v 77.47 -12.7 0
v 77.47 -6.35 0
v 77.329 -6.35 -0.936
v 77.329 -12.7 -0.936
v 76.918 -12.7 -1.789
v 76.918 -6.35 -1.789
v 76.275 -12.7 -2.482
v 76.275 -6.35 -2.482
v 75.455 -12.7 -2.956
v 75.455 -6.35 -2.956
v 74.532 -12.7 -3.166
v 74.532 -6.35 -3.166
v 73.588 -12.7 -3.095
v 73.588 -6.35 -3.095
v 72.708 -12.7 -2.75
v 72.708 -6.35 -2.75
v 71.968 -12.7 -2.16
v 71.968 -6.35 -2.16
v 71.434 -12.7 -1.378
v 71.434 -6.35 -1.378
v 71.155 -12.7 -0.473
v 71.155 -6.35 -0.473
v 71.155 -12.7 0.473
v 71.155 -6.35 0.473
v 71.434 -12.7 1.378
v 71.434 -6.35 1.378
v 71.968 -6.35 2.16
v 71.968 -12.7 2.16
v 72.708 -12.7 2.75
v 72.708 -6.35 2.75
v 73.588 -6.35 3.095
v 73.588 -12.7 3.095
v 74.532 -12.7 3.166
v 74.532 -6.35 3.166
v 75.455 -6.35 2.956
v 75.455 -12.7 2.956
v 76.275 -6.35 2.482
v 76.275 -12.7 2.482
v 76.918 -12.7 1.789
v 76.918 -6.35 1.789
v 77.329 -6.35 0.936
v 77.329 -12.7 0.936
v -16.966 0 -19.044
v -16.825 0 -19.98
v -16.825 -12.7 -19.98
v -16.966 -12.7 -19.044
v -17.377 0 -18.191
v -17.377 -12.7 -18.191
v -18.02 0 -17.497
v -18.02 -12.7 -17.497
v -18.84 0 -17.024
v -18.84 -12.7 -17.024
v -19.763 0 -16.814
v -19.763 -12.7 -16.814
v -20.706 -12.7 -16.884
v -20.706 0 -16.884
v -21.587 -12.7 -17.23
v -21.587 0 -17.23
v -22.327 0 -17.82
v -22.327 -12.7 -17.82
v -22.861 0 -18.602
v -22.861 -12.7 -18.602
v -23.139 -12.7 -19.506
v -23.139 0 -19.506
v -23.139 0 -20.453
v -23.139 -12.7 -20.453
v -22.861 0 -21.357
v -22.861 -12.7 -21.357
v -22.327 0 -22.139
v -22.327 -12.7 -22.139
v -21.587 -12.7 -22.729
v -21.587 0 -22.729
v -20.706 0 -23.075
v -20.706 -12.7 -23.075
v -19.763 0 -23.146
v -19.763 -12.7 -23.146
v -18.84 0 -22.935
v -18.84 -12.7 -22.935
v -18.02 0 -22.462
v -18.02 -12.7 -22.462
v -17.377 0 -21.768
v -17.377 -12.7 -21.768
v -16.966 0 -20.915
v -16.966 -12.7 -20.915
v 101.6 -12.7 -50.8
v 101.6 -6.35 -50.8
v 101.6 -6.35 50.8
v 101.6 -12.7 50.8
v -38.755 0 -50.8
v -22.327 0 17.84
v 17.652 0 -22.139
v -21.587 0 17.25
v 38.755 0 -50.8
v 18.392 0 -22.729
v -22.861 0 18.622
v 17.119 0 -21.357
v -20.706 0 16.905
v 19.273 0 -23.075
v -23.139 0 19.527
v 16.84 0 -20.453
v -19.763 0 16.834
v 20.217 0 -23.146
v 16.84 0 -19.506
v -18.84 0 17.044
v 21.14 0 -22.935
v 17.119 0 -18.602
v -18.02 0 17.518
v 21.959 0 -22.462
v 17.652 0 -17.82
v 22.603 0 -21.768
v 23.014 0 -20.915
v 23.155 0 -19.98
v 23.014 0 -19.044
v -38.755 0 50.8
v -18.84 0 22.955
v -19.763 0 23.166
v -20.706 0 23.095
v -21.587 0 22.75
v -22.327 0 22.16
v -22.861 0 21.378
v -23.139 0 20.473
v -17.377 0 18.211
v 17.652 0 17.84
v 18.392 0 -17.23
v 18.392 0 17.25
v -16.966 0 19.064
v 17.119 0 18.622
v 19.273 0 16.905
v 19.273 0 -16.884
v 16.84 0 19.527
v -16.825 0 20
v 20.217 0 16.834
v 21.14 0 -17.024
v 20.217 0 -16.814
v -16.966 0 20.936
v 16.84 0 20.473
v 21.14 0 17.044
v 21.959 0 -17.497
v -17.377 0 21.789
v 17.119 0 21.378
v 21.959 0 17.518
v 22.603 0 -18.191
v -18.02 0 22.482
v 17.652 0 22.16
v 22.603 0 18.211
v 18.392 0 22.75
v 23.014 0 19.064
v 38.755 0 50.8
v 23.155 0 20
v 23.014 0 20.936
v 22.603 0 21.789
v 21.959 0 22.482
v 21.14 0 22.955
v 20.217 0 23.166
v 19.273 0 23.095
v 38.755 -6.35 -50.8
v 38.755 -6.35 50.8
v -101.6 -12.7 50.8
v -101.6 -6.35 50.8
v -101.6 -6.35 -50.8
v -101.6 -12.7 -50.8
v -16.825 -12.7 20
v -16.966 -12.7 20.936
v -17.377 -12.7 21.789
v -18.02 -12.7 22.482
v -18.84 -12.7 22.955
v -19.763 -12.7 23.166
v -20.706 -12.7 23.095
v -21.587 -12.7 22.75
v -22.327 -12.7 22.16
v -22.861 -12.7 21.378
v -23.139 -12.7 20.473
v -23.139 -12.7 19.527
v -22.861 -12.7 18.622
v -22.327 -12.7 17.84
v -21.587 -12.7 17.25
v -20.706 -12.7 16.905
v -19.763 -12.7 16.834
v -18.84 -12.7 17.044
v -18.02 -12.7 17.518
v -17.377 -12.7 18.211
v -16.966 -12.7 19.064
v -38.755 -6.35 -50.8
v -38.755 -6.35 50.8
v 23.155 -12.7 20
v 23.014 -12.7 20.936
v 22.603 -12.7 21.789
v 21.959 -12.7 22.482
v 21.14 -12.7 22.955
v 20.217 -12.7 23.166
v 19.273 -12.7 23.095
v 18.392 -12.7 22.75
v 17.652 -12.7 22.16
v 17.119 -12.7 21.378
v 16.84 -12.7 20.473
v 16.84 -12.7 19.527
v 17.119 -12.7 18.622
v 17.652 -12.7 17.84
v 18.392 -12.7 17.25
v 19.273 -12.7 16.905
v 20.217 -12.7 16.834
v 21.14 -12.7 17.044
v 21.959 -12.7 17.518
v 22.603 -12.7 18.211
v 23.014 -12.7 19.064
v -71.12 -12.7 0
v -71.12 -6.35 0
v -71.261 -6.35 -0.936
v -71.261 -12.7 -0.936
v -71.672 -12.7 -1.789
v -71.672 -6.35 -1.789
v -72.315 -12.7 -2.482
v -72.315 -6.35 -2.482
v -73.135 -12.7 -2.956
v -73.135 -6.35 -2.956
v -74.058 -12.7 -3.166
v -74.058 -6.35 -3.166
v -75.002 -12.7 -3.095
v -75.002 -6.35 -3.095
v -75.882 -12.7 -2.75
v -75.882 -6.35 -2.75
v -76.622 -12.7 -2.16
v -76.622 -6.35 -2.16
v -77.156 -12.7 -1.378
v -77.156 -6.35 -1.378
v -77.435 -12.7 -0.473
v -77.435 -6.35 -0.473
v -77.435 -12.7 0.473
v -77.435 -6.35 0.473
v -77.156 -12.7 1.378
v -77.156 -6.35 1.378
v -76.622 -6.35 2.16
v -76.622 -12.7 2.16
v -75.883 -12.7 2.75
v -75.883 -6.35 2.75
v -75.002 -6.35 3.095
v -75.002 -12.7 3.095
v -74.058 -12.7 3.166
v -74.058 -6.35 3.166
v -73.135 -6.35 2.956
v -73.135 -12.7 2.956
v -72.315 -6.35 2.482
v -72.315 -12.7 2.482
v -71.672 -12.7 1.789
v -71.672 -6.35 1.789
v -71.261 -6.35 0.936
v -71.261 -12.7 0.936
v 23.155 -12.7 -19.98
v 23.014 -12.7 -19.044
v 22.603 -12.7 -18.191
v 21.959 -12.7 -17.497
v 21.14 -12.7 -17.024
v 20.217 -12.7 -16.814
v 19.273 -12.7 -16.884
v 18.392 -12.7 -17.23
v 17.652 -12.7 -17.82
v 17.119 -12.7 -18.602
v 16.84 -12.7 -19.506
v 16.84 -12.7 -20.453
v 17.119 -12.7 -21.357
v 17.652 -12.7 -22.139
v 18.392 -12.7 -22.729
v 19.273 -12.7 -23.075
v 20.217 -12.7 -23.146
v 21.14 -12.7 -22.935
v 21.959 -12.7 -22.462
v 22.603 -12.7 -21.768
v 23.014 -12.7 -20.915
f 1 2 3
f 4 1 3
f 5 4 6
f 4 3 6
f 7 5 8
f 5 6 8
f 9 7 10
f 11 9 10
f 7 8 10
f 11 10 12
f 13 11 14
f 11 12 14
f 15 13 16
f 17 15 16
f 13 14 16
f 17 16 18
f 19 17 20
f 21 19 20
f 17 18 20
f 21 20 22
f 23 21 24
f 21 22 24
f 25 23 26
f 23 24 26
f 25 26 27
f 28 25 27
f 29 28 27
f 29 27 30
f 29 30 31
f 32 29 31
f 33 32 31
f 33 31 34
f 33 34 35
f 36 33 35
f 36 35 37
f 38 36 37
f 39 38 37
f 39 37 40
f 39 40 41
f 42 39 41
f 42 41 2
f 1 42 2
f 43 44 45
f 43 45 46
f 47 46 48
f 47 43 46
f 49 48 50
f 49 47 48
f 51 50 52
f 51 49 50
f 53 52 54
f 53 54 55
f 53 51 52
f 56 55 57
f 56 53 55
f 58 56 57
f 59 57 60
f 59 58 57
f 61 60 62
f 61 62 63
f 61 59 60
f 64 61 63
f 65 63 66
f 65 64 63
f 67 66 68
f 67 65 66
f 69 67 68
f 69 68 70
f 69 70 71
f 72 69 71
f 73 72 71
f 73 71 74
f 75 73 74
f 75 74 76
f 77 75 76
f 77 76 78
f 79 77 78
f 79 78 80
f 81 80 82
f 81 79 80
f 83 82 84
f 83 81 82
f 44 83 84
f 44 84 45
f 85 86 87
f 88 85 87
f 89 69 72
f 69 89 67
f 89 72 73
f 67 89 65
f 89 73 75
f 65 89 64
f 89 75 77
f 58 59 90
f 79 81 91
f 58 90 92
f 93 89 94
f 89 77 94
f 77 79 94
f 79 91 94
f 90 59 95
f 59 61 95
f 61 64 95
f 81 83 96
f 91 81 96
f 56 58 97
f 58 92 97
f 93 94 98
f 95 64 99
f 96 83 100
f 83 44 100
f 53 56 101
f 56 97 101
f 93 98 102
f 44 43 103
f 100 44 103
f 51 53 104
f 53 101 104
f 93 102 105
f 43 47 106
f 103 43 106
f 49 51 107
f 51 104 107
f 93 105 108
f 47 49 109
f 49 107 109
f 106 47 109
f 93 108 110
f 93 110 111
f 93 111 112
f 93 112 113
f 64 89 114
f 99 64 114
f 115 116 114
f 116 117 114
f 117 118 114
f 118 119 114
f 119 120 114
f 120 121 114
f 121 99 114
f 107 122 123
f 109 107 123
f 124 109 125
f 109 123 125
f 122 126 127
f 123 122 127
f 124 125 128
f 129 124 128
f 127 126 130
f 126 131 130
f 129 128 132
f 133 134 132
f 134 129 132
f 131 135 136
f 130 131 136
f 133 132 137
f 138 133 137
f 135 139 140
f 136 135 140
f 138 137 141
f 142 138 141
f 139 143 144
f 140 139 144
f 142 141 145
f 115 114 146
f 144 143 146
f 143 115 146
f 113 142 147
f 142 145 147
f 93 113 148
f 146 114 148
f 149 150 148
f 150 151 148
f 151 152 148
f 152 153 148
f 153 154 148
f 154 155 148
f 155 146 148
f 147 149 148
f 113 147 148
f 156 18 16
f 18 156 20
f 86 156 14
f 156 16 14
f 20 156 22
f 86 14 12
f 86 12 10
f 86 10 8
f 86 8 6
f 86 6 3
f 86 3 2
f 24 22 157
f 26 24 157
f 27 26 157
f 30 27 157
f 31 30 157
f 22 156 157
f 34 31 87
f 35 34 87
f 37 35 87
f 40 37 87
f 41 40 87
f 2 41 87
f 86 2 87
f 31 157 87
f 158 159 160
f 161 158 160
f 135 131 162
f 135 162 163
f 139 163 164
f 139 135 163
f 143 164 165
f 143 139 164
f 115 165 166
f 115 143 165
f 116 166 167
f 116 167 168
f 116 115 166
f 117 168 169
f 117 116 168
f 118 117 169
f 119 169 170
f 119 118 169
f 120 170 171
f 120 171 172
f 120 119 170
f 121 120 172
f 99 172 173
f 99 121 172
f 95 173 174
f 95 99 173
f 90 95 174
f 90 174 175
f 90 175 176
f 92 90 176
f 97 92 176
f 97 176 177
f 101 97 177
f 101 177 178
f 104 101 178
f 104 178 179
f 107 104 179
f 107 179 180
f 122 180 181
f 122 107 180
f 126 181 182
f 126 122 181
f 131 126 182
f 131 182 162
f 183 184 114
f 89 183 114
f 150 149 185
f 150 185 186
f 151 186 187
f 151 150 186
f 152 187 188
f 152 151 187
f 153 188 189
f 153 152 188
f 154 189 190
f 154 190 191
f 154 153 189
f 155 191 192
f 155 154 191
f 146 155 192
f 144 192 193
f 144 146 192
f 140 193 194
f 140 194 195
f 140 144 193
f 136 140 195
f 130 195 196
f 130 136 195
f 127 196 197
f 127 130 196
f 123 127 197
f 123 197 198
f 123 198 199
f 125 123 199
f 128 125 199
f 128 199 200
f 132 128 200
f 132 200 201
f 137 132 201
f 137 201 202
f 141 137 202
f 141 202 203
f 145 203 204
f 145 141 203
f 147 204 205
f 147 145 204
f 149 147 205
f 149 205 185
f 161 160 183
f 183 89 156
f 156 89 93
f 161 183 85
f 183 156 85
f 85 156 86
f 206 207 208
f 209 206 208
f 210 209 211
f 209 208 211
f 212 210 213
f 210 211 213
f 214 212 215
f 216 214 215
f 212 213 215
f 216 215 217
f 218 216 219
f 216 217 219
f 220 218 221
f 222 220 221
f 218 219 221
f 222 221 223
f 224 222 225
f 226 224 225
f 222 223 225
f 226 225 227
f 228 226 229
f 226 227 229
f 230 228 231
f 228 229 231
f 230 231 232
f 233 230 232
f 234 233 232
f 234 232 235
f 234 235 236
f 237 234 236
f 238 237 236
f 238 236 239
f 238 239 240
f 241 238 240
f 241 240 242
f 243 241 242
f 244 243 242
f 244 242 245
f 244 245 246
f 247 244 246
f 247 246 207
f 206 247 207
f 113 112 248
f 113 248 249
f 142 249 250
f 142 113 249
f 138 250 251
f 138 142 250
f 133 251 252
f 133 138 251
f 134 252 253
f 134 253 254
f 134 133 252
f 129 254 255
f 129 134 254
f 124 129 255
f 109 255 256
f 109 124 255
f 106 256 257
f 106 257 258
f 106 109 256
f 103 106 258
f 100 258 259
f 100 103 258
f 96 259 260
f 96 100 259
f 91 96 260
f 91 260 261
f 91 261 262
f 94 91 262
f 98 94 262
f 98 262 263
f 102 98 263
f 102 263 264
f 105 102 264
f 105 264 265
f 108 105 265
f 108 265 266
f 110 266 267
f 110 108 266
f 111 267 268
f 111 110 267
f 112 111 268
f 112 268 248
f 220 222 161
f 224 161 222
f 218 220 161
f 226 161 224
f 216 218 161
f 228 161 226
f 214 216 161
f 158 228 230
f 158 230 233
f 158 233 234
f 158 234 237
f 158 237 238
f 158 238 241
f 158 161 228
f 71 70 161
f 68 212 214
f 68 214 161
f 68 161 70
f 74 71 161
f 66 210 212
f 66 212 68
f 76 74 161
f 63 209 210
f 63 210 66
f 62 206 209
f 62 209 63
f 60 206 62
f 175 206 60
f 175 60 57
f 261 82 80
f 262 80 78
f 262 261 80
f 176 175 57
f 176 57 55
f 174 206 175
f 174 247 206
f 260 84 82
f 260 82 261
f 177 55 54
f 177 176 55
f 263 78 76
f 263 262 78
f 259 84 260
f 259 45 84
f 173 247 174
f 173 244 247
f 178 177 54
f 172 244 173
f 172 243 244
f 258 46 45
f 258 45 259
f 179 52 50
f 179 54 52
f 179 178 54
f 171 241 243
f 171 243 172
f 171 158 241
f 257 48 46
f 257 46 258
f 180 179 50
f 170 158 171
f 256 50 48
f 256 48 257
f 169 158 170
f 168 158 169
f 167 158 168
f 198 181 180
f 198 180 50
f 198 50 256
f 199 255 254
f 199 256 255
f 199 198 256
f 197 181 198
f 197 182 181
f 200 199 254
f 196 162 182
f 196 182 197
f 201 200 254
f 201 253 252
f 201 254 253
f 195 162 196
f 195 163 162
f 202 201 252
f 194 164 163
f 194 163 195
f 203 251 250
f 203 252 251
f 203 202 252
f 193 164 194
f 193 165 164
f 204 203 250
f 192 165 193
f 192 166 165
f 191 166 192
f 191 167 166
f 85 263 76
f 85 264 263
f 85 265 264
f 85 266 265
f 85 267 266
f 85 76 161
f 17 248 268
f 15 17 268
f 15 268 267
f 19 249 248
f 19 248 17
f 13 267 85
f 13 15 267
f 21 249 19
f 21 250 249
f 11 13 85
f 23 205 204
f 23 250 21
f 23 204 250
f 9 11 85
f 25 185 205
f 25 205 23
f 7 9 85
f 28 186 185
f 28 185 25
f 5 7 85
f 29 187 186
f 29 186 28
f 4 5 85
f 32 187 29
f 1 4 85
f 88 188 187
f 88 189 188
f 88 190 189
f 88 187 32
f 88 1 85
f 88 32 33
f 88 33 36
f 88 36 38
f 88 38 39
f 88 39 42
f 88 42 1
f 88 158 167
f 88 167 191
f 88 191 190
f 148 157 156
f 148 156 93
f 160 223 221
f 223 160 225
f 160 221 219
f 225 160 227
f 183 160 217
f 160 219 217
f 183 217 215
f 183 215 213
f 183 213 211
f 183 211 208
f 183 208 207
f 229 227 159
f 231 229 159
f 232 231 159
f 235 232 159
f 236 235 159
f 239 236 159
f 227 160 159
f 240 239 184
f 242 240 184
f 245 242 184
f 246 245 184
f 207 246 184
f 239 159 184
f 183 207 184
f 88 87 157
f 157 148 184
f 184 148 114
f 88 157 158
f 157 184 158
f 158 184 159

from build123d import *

# Parameters (mm, degrees)
F0_R     = 3.175
F1_DEPTH = 12.7
F2_W     = 62.84501
F2_H     = 6.35
F3_DEPTH = 101.601
F4_DEPTH = 101.601


with BuildPart() as f1:
    # F0 (on Front) → F1 (new body)
    with BuildSketch(Plane.XZ):
        with BuildLine():
            Line((0, 50.8), (-101.6, 50.8))
            Line((-101.6, 50.8), (-101.6, 0))
            Line((-101.6, 0), (-77.47, 0))
            ThreePointArc((-77.47, 0), (-74.295, 3.175), (-71.12, 0))
            Line((-71.12, 0), (0, 0))
            Line((0, 0), (0, 50.8))
        make_face()
        with Locations((-19.99996, 19.99996)):
            Circle(F0_R, mode=Mode.SUBTRACT)
        with BuildLine():
            Line((101.6, 50.8), (0, 50.8))
            Line((0, 50.8), (0, 0))
            Line((0, 0), (71.12, 0))
            ThreePointArc((71.12, 0), (74.295, 3.175), (77.47, 0))
            Line((77.47, 0), (101.6, 0))
            Line((101.6, 0), (101.6, 50.8))
        make_face()
        with Locations((19.97964, 19.99996)):
            Circle(F0_R, mode=Mode.SUBTRACT)
        with BuildLine():
            Line((-77.47, 0), (-101.6, 0))
            Line((-101.6, 0), (-101.6, -50.8))
            Line((-101.6, -50.8), (0, -50.8))
            Line((0, -50.8), (0, 0))
            Line((0, 0), (-71.12, 0))
            ThreePointArc((-71.12, 0), (-74.295, -3.175), (-77.47, 0))
        make_face()
        with Locations((-19.99996, -19.97964)):
            Circle(F0_R, mode=Mode.SUBTRACT)
        with BuildLine():
            Line((71.12, 0), (0, 0))
            Line((0, 0), (0, -50.8))
            Line((0, -50.8), (101.6, -50.8))
            Line((101.6, -50.8), (101.6, 0))
            Line((101.6, 0), (77.47, 0))
            ThreePointArc((77.47, 0), (74.295, -3.175), (71.12, 0))
        make_face()
        with Locations((19.97964, -19.97964)):
            Circle(F0_R, mode=Mode.SUBTRACT)
    extrude(amount=F1_DEPTH)

    # F2 (on face) → F3 (cut, through all)
    with BuildSketch(Plane.XY.offset(50.8)):
        with Locations((-70.177495, -3.175)):
            Rectangle(F2_W, F2_H)
    extrude(amount=-F3_DEPTH, mode=Mode.SUBTRACT)

    # F2 (on face) → F4 (cut, through all)
    with BuildSketch(Plane.XY.offset(50.8)):
        with Locations((70.177495, -3.175)):
            Rectangle(F2_W, F2_H)
    extrude(amount=-F4_DEPTH, mode=Mode.SUBTRACT)


solid = f1.part
